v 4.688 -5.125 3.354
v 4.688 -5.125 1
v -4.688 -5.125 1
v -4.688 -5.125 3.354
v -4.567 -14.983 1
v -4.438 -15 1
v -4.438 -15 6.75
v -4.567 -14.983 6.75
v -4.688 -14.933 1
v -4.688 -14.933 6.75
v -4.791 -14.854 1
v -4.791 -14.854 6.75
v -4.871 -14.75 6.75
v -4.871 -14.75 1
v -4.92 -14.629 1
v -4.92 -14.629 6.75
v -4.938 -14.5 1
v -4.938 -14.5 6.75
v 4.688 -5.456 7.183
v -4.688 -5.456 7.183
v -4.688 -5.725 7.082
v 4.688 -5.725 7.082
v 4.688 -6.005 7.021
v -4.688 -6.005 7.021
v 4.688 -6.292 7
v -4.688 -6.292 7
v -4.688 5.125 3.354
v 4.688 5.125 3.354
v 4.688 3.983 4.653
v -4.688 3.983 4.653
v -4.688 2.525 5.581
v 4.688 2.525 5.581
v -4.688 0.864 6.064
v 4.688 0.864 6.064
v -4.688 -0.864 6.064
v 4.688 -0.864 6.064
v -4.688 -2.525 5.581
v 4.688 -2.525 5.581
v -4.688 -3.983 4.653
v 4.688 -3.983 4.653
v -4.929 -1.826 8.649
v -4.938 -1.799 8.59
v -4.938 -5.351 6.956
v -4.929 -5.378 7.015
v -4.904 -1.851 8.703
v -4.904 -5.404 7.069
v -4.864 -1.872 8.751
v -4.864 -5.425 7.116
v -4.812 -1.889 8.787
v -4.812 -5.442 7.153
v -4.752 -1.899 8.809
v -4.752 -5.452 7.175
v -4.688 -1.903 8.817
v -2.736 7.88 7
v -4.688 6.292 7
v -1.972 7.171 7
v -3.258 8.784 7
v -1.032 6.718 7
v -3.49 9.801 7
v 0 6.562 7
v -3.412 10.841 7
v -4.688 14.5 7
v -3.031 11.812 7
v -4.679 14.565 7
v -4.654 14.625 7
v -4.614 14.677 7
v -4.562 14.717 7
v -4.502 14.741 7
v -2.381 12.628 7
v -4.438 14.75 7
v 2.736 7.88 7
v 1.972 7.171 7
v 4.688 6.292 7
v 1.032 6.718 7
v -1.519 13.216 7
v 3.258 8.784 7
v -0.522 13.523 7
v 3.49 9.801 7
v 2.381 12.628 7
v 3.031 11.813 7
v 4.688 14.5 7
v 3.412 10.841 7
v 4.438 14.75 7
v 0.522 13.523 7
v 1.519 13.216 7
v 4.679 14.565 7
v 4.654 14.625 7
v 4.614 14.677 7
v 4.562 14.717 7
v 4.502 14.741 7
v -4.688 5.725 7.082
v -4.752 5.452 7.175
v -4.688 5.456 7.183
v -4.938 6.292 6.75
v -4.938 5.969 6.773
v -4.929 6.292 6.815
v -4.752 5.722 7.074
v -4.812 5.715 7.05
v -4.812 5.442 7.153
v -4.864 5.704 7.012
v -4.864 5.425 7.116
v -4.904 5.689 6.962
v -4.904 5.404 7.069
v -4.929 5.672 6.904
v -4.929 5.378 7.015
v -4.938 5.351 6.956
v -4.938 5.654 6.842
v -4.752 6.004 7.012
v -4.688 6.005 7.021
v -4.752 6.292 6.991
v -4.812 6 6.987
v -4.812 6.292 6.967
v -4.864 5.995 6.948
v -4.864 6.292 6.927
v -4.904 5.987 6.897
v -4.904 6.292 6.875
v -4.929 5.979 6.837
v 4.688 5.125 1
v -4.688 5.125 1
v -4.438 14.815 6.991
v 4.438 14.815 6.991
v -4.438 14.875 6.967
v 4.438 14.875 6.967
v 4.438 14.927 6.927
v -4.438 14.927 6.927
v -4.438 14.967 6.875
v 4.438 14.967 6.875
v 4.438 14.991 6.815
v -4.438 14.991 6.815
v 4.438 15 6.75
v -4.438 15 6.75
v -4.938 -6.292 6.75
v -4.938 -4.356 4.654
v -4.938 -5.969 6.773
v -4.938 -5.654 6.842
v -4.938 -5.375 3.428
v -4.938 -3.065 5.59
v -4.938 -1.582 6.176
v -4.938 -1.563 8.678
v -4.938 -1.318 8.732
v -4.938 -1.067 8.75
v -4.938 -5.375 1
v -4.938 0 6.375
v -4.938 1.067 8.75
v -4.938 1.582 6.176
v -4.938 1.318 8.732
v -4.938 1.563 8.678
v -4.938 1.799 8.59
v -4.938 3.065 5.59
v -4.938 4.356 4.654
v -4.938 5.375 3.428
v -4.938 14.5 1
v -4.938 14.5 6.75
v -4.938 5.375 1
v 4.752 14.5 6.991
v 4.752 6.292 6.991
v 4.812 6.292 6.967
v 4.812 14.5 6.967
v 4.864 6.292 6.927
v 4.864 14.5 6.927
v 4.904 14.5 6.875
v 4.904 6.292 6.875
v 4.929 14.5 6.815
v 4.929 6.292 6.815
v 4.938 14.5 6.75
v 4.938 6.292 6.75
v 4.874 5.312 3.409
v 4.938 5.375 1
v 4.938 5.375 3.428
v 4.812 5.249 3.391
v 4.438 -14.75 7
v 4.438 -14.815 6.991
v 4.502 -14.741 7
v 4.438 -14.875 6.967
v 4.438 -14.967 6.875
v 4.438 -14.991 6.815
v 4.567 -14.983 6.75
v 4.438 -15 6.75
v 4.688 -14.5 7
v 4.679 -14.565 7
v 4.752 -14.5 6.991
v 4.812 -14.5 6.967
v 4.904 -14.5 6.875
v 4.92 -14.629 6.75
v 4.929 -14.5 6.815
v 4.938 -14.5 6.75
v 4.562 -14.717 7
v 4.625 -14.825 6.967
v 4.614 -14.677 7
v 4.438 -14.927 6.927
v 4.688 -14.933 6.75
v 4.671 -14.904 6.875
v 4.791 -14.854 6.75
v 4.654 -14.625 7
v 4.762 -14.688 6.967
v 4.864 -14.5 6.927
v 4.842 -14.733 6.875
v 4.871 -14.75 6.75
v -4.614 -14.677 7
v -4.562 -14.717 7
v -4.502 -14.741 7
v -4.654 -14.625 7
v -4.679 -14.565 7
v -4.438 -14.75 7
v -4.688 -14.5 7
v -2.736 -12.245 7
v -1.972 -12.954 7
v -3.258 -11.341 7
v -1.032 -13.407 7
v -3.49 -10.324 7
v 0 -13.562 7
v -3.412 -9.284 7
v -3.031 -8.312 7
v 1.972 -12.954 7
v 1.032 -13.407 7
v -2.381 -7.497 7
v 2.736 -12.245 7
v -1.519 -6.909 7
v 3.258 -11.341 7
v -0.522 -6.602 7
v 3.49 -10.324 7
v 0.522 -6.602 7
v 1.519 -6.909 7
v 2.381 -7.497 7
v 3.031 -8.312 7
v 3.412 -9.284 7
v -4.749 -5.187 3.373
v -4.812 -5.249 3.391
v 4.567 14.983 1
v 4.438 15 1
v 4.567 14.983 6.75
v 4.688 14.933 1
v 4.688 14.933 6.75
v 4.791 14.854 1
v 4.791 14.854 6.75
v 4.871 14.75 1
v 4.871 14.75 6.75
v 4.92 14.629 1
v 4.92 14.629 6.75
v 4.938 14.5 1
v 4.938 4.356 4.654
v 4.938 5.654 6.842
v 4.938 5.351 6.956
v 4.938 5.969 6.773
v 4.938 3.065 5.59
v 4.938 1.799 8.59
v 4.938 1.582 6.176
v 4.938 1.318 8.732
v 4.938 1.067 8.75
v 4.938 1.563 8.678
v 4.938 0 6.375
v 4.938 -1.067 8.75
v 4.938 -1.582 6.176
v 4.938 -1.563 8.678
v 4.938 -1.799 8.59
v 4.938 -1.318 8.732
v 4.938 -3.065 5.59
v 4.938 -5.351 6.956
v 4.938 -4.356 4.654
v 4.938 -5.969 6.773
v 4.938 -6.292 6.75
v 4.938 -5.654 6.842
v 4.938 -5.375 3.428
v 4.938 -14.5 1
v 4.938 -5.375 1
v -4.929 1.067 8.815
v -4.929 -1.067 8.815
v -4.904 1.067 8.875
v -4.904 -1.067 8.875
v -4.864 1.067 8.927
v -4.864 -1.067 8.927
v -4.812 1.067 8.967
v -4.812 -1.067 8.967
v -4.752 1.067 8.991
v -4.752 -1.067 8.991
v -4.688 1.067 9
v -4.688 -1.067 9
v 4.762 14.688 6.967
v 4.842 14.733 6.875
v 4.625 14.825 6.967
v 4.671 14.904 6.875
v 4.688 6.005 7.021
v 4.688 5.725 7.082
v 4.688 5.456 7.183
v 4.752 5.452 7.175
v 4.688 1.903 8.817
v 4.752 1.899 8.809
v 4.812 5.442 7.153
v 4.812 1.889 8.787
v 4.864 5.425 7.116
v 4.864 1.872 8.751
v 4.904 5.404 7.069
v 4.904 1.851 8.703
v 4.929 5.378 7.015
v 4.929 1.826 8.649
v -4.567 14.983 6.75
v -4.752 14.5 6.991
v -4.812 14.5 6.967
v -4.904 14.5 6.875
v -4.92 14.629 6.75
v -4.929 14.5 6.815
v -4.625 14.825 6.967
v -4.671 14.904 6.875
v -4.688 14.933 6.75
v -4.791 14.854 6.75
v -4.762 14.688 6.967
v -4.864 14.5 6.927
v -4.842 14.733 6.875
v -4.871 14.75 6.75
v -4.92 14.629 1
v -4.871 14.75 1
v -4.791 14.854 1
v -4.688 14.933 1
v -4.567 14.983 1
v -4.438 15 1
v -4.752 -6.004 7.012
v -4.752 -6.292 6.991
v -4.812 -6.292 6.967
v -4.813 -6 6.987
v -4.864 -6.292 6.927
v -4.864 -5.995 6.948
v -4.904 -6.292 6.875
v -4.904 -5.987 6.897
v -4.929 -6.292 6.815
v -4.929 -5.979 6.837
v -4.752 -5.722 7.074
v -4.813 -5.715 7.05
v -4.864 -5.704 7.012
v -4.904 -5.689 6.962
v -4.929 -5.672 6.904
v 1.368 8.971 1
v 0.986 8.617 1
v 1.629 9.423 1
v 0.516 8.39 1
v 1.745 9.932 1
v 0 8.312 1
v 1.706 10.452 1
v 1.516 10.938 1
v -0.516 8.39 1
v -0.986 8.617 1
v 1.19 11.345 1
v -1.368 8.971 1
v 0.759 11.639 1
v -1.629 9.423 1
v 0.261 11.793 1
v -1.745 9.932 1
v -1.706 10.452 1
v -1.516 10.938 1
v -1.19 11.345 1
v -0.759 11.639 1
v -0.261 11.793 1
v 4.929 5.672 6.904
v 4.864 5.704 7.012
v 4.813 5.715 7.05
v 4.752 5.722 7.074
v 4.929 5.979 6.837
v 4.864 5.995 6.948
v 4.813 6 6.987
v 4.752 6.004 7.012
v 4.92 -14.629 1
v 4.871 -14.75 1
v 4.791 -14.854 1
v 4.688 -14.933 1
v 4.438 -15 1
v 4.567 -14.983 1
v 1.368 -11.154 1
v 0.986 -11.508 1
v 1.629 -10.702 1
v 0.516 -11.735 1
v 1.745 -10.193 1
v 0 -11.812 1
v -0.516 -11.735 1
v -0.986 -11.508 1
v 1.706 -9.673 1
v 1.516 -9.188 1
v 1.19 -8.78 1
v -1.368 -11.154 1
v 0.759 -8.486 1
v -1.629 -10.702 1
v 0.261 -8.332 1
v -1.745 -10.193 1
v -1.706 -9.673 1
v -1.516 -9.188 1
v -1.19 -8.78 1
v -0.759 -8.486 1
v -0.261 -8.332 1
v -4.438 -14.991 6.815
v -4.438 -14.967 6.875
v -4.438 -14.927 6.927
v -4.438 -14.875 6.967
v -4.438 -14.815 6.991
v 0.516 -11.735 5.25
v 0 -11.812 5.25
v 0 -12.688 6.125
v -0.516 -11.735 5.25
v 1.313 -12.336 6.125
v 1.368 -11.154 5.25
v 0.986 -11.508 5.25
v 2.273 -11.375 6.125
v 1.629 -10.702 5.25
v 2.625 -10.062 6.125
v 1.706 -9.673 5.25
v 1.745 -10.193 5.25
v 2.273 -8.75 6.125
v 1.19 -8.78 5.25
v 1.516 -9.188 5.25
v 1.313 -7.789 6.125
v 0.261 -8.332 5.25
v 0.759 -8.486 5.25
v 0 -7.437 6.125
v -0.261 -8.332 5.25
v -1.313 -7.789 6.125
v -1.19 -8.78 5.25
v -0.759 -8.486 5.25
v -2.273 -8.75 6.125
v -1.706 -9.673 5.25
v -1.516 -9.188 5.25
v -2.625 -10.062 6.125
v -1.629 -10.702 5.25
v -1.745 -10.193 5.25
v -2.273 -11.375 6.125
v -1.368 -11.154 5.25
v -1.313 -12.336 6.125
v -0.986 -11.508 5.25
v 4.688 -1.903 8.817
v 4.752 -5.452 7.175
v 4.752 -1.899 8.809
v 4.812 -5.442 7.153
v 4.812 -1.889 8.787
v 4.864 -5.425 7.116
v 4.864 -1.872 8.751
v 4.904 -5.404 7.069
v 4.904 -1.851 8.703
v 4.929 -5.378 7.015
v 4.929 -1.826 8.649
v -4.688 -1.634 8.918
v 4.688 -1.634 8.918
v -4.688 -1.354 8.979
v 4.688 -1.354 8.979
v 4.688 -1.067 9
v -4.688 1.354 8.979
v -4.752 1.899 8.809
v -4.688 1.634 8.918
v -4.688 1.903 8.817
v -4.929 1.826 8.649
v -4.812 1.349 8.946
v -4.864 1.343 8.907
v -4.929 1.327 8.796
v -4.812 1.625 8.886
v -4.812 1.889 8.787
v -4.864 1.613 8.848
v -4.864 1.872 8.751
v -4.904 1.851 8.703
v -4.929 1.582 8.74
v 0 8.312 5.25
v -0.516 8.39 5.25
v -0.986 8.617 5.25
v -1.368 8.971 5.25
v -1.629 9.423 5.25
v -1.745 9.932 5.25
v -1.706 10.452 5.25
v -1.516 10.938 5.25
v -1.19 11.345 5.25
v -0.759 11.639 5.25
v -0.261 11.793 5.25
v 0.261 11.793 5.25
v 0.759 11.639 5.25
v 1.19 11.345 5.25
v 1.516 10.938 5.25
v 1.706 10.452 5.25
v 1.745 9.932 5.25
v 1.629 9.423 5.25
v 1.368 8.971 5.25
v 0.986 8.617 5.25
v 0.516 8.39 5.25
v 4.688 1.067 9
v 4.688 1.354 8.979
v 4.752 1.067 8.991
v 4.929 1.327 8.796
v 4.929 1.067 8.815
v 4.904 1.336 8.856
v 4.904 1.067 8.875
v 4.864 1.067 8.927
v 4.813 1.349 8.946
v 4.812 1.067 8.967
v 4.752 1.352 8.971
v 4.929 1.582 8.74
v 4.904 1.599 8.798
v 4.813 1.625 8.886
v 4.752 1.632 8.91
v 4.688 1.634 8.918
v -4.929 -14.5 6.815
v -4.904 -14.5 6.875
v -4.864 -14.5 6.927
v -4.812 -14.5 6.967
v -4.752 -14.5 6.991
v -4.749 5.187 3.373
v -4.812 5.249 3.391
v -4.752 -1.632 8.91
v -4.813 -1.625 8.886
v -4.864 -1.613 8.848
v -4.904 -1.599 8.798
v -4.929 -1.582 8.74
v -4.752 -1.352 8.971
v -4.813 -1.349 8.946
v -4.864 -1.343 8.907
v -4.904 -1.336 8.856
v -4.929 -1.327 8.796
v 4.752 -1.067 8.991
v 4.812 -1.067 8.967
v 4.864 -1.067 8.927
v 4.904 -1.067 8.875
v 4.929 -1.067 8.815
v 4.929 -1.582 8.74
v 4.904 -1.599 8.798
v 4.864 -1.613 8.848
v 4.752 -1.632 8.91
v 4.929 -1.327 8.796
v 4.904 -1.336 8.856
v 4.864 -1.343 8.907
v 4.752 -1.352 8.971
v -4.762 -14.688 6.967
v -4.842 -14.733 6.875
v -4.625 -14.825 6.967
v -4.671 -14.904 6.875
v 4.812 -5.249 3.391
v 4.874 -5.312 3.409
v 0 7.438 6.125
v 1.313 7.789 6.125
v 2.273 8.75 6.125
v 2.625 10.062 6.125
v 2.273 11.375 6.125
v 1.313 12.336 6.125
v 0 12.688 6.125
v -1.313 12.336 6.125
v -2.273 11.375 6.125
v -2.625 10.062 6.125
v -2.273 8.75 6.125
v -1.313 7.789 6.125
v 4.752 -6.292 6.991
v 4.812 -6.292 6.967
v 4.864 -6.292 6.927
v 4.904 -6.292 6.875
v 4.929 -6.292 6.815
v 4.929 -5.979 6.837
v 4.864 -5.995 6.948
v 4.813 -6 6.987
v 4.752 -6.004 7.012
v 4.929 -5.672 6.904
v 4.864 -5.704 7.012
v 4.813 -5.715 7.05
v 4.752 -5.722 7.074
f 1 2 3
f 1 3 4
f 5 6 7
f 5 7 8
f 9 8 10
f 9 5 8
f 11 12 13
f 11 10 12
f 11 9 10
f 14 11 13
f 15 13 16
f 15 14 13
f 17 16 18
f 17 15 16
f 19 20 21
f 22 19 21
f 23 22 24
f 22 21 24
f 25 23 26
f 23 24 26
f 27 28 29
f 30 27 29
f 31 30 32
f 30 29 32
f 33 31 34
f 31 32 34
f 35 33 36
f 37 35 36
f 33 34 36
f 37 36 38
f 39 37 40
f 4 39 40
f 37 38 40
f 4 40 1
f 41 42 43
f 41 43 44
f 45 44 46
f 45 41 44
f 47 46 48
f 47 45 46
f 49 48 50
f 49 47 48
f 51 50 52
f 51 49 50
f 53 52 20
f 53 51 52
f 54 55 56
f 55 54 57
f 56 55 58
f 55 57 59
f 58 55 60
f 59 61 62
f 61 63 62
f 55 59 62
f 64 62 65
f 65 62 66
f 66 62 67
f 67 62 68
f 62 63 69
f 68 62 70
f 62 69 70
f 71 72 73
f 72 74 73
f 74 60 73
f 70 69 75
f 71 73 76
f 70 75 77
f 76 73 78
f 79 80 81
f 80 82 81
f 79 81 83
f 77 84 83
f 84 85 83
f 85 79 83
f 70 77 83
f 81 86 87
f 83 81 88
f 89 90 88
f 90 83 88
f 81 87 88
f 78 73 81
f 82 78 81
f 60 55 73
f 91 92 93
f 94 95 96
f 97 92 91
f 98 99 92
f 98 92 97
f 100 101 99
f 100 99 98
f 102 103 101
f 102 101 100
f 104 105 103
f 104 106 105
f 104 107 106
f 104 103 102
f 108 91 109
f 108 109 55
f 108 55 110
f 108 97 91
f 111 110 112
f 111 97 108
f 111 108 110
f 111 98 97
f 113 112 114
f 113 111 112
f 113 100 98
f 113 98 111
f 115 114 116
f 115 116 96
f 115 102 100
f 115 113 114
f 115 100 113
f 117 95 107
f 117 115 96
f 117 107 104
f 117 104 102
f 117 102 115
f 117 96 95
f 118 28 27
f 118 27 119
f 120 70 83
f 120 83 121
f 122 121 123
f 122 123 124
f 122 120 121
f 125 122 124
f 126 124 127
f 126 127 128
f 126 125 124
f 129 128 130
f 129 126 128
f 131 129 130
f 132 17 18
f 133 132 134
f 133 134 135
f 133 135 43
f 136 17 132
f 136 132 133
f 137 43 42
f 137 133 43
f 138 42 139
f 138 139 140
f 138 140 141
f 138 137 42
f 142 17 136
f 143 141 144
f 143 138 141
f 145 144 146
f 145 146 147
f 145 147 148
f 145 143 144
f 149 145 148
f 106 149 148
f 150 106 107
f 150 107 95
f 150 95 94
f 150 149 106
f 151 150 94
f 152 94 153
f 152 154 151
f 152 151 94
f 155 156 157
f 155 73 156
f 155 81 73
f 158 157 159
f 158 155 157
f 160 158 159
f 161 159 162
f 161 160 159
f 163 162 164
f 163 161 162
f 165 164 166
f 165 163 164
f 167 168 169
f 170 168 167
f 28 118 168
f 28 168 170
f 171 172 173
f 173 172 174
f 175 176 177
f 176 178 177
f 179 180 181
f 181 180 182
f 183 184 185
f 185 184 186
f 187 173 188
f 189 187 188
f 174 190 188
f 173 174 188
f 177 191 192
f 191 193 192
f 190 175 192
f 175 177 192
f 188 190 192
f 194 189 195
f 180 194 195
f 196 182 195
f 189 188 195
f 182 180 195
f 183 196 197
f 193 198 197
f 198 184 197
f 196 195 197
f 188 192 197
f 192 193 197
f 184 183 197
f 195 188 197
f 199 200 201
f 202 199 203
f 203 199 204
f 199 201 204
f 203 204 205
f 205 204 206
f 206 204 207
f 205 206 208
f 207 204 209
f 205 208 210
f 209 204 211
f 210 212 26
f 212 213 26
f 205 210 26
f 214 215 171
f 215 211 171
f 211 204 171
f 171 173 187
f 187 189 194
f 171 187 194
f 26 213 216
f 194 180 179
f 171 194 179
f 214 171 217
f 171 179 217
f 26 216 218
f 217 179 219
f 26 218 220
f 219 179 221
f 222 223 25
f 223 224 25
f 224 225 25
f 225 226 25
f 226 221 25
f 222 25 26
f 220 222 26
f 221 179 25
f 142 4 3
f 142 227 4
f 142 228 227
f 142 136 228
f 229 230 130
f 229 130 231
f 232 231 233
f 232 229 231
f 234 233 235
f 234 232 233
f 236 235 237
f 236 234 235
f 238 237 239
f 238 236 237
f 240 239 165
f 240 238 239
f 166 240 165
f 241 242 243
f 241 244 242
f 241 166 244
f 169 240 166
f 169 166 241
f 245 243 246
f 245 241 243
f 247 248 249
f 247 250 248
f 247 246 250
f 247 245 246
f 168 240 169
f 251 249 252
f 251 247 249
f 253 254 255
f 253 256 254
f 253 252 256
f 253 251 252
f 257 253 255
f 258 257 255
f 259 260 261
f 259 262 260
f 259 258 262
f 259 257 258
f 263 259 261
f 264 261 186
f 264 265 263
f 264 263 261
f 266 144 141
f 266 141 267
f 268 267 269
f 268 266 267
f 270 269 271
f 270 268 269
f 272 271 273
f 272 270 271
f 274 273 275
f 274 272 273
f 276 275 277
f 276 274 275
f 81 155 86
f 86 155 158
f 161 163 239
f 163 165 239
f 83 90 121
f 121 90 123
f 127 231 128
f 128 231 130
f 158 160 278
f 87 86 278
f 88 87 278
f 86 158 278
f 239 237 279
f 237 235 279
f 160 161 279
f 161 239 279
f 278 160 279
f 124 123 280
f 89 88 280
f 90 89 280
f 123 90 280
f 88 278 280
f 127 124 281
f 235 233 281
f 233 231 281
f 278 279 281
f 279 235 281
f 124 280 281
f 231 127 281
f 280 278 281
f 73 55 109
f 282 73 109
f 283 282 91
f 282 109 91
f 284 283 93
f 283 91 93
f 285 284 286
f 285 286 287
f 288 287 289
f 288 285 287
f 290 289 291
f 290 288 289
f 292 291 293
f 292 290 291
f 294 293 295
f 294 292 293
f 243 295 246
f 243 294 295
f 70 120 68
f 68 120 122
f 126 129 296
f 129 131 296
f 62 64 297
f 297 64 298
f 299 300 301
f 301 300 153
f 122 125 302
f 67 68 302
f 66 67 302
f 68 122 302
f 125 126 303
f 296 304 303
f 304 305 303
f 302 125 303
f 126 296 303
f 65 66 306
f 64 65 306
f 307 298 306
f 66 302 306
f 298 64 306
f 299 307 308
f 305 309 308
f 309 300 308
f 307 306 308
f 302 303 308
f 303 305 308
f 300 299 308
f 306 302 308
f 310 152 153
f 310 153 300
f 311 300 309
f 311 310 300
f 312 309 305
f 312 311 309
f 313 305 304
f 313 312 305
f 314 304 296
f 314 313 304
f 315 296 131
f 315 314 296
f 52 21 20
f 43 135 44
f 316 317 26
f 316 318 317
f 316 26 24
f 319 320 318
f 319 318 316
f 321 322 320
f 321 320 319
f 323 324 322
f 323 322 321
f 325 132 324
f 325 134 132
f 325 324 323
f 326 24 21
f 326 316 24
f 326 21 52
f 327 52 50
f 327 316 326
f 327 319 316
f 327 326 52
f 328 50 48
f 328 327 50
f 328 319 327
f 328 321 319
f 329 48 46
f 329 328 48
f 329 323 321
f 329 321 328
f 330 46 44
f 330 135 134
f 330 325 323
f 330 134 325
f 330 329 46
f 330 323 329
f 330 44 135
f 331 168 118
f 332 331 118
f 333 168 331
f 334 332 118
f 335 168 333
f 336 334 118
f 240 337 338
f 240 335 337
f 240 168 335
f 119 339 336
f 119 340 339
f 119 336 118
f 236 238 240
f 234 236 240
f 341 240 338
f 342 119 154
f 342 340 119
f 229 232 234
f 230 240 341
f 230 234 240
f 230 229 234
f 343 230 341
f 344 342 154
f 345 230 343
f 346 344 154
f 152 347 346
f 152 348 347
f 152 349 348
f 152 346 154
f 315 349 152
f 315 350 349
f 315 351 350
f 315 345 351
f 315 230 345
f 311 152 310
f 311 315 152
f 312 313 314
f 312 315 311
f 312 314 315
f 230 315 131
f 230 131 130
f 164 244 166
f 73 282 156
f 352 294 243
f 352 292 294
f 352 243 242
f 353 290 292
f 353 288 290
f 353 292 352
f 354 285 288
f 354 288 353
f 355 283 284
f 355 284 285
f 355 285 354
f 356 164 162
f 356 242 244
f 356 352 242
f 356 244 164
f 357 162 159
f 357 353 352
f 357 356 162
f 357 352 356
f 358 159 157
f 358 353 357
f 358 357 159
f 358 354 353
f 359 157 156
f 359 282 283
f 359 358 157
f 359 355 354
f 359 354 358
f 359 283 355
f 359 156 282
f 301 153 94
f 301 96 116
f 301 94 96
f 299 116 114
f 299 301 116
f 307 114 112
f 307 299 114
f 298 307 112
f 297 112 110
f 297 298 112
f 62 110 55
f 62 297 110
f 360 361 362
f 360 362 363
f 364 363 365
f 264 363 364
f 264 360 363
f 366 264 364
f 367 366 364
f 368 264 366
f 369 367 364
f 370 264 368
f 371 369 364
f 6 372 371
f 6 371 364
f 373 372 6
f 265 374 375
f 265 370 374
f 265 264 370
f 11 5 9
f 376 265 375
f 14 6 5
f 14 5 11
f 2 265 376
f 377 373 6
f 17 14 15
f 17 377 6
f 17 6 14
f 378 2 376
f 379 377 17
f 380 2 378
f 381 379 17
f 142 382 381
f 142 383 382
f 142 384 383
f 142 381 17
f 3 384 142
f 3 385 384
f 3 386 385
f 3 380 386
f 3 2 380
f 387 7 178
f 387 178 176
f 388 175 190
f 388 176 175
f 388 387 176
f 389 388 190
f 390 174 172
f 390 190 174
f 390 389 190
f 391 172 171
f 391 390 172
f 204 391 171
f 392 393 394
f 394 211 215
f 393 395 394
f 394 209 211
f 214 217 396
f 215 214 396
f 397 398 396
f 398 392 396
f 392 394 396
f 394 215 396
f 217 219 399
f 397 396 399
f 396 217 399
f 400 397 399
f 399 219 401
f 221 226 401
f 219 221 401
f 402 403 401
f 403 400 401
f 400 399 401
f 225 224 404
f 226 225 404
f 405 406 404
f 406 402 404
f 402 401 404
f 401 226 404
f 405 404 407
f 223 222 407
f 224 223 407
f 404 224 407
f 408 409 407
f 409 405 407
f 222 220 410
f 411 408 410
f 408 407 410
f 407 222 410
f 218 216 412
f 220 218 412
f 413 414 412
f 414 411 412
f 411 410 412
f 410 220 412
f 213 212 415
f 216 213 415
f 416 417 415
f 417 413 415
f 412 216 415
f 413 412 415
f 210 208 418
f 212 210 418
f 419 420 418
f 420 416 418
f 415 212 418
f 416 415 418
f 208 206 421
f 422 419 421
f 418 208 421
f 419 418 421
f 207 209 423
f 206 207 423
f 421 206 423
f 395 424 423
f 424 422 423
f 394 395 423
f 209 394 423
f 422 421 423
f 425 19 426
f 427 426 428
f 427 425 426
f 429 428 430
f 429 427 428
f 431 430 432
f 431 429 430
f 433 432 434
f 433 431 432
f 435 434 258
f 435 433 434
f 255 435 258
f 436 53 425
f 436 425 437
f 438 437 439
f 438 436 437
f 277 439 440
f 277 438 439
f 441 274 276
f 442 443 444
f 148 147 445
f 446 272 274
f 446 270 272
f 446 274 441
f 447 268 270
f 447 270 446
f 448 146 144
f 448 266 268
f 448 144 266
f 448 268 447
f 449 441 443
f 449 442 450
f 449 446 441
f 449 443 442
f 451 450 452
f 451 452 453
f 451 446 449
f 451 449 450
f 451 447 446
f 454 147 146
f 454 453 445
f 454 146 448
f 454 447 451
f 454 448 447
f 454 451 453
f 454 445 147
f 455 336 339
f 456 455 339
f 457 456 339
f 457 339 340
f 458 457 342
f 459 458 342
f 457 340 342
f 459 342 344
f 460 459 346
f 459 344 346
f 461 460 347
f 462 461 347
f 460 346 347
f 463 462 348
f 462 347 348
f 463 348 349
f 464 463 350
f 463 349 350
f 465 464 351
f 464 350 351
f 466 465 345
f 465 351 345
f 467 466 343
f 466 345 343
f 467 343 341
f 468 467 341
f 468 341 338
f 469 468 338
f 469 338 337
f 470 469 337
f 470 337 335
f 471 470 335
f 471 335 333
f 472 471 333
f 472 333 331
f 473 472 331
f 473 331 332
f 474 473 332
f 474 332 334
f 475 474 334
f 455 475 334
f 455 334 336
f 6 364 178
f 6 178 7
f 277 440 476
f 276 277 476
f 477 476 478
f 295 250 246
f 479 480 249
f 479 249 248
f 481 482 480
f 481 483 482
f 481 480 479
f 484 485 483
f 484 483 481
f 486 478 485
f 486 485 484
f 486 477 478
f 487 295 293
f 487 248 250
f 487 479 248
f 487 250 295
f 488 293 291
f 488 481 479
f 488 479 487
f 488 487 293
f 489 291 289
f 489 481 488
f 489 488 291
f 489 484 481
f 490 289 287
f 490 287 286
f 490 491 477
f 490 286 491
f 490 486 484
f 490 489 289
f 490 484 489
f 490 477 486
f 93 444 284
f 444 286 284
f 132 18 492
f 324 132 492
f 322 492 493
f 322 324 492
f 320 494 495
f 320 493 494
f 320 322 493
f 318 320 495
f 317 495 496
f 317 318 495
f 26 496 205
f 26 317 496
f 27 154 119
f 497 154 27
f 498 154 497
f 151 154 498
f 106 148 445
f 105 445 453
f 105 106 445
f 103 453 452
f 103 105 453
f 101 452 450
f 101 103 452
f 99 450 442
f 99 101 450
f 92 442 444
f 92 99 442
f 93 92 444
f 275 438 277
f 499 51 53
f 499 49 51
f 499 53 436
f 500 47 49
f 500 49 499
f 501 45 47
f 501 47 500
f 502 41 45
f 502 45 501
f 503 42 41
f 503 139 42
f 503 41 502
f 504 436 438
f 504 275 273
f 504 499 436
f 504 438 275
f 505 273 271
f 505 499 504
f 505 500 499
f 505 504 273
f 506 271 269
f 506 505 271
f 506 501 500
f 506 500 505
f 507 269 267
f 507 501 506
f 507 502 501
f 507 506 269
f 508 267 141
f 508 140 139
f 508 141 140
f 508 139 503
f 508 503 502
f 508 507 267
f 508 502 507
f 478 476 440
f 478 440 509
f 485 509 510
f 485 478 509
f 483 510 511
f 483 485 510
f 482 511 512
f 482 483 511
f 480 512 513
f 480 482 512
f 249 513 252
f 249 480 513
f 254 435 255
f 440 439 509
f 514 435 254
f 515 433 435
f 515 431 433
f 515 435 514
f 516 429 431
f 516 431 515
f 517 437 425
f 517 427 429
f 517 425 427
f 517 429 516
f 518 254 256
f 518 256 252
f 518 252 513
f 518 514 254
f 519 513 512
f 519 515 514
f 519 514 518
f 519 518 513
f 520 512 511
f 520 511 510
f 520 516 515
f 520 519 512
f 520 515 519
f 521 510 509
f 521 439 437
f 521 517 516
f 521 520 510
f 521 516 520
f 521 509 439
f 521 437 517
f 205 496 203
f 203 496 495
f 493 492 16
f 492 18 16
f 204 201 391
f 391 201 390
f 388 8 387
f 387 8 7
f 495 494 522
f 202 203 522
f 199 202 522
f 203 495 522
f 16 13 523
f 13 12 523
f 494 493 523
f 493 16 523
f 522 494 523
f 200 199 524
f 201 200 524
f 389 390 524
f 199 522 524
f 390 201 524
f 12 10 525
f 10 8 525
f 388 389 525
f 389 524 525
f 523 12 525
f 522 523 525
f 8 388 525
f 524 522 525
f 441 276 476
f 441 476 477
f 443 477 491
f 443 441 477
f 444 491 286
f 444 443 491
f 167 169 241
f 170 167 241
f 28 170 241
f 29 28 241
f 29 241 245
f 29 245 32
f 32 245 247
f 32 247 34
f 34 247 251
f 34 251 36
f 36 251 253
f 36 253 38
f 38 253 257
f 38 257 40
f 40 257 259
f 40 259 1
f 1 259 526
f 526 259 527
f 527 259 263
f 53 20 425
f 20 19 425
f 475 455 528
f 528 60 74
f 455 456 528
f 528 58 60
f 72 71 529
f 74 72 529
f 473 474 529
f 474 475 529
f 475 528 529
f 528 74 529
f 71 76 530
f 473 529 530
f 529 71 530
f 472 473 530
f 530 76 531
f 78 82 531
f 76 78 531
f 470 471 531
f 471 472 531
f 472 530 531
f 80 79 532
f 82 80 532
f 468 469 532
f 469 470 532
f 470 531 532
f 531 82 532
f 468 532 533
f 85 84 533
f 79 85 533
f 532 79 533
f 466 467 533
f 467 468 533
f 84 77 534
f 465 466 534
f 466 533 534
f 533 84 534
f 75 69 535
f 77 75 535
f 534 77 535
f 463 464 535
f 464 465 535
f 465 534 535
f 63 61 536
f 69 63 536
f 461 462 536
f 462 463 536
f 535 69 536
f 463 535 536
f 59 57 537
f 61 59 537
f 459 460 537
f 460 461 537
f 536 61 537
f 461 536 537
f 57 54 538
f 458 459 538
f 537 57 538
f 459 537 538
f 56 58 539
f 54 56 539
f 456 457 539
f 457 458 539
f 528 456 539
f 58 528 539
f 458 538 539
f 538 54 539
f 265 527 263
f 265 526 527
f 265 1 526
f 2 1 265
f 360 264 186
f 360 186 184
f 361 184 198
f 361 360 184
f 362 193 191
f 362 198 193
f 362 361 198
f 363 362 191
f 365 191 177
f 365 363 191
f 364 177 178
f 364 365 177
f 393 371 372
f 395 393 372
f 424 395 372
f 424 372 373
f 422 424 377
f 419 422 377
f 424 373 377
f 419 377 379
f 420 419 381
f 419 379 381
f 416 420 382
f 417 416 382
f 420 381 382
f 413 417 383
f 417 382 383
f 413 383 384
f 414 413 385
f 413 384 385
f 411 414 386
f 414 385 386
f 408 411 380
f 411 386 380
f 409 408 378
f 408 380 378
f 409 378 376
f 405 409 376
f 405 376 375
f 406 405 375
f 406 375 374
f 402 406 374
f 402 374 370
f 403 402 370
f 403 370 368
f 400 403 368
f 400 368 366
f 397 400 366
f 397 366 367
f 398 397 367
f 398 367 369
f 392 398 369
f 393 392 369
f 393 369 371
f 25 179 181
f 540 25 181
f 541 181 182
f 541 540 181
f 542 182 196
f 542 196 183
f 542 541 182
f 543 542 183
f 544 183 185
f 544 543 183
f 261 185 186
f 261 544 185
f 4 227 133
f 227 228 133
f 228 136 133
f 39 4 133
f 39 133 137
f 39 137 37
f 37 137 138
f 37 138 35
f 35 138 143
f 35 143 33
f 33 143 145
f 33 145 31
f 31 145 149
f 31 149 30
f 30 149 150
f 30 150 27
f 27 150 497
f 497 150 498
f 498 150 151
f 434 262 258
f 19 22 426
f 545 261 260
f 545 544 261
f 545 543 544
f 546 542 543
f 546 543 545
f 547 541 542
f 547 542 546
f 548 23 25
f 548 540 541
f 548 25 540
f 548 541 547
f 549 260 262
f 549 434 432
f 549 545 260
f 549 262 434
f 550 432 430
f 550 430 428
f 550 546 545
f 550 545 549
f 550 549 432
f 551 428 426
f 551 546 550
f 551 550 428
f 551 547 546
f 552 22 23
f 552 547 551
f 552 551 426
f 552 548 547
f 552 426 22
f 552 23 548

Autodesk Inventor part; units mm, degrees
ref_plane "YZ Plane" through (0, 0, 0) normal (1, 0, 0) x (0, 1, 0)
ref_plane "XZ Plane" through (0, 0, 0) normal (0, 1, 0) x (-1, 0, 0)
ref_plane "XY Plane" through (0, 0, 0) normal (0, 0, 1) x (1, 0, 0)
sketch "Náčrt1" plane through (0, 0, 0) normal (0, 0, 1) x (1, 0, 0)
  line L0 (-4.9375, 15) -> (4.9375, 15)
  line L1 (4.9375, 15) -> (4.9375, -15)
  line L2 (4.9375, -15) -> (-4.9375, -15)
  line L3 (-4.9375, -15) -> (-4.9375, 15)
  line L4 (-4.9375, 15) -> (4.9375, -15) construction
  line L5 (4.9375, 15) -> (-4.9375, -15) construction
  circle A0 centre (0, 10.0625) radius 1.5
  circle A1 centre (0, -10.0625) radius 1.5
  line L6 (-4.9375, 0) -> (4.9375, 0)
  point P0 (0, 0)
  point P1 (0, 15)
  dimension "d0" = 30
  dimension "d1" = 9.875
  dimension "d2" = 3
  dimension "d4" = 4.9375
extrude "Vysunutí1" add sketch "Náčrt1" along normal blind 10
sketch "Náčrt2" plane through (4.9375, -15, 0) normal (1, 0, 0) x (0, 0, -1)
  line L0 (0, 0) -> (0, 30) projected
  line L1 (0, 10) -> (-3.3166, 10)
  arc A0 (-3.3166, 20) -> (-3.3166, 10) centre (0, 15) ccw
  line L2 (-3.3166, 20) -> (0, 20)
  line L3 (0, 9.875) -> (-3.3541, 9.875)
  arc A1 (-3.3541, 20.125) -> (-3.3541, 9.875) centre (0, 15) ccw
  line L4 (-3.3541, 20.125) -> (0, 20.125)
  line L5 (0, 30) -> (-10, 30) projected
  line L6 (0, 6.875) -> (-4.1533, 6.875) construction
  arc A2 (-4.1533, 23.125) -> (-4.1533, 6.875) centre (0, 15) ccw construction
  line L7 (-4.1533, 23.125) -> (0, 23.125) construction
  line L8 (0, 0) -> (-10, 0) projected
  line L9 (-7, 0) -> (-7, 9.1463)
  line L10 (-7, 9.1463) -> (-9, 13.4948)
  line L11 (-9, 16.5052) -> (-7, 20.8537)
  line L12 (-7, 20.8537) -> (-7, 30)
  line L13 (-9, 13.4948) -> (-9, 16.5052)
  line L14 (-10, 0) -> (-10, 30) projected
  point P0 (0, 15)
  point P1 (0, 9.875)
  point P2 (-9, 15)
  point P3 (-10, 15)
  dimension "d7" = 6
  dimension "d8" = 10
  dimension "d9" = 0.125
  dimension "d16" = 3
  dimension "d17" = 3
  dimension "d18" = 3
  dimension "d19" = 1
extrude "Vysunutí2" cut sketch "Náčrt2" against normal through all contours L3 A1 L4 L0 L2 A0 L1 | L8 L14 L5 L12 L11 L13 L10 L9 | L1 A0 L2 L0
fillet "Zaoblení1" radius 2 4 edges at (0, -1.5052, 9) (0, 1.5052, 9) (0, 5.8537, 7) (0, -5.8537, 7)
fillet "Zaoblení2" radius 0.25 20 edges at (0, -15, 7) (0, 15, 7) (4.9375, -5.8638, 7.0463) (4.9375, -3.6794, 8) (4.9375, -1.4951, 8.9537) (4.9375, 0, 9) (4.9375, 1.4951, 8.9537) (4.9375, 3.6794, 8) (4.9375, 5.8638, 7.0463) (4.9375, 10.6458, 7) (4.9375, -10.6458, 7) (-4.9375, -5.8638, 7.0463) (-4.9375, -3.6794, 8) (-4.9375, -1.4951, 8.9537) (-4.9375, 0, 9) (-4.9375, 1.4951, 8.9537) (-4.9375, 3.6794, 8) (-4.9375, 5.8638, 7.0463) (-4.9375, 10.6458, 7) (-4.9375, -10.6458, 7)
sketch "Náčrt3" plane through (0, 0, 0) normal (0, 0, -1) x (-1, 0, 0)
  line L0 (4.9375, -5.125) -> (-4.9375, -5.125) projected
  line L1 (-4.9375, -15) -> (-4.9375, -5.125) projected
  line L2 (4.9375, -15) -> (-4.9375, -15) projected
  line L3 (4.9375, -5.125) -> (4.9375, -15) projected
  circle A0 centre (0, -10.0625) radius 1.5 projected
  line L4 (-4.9375, 5.125) -> (4.9375, 5.125) projected
  line L5 (4.9375, 15) -> (4.9375, 5.125) projected
  line L6 (-4.9375, 15) -> (4.9375, 15) projected
  line L7 (-4.9375, 5.125) -> (-4.9375, 15) projected
  circle A1 centre (0, 10.0625) radius 1.5 projected
  point P0 (0, 0)
extrude "Vysunutí3" cut sketch "Náčrt3" against normal blind 1
chamfer "Zkosení1" distance 0.25 angle 45 6 edges at (4.9375, -5.125, 2.1771) (4.9375, 0, 6.125) (4.9375, 5.125, 2.1771) (-4.9375, -5.125, 2.1771) (-4.9375, 0, 6.125) (-4.9375, 5.125, 2.1771)
fillet "Zaoblení3" radius 0.5 8 edges at (4.8643, -14.9268, 6.9268) (4.9375, -15, 3.875) (-4.8643, -14.9268, 6.9268) (-4.9375, -15, 3.875) (-4.8643, 14.9268, 6.9268) (-4.9375, 15, 3.875) (4.8643, 14.9268, 6.9268) (4.9375, 15, 3.875)
sketch "Náčrt4" plane through (-4.6875, 6.2916, 7) normal (0, 0, 1) x (1, 0, 0)
  circle A0 centre (4.6875, 3.7709) radius 1.5 projected
  point P0 (4.6875, -6.2916)
hole "Díra1" at (0, 10.0625, 7) direction (0, 0, -1) diameter 3.5 end through all countersink diameter 7 countersink angle 90
sketch "Náčrt5" plane through (-4.6875, -6.2916, 7) normal (0, 0, 1) x (1, 0, 0)
  circle A0 centre (4.6875, -3.7709) radius 1.5 projected
  point P0 (4.6875, 6.2916)
hole "Díra2" at (0, -10.0625, 7) direction (0, 0, -1) diameter 3.5 end through all countersink diameter 7 countersink angle 90
properties part number "Objímka motoru pro plochu s držákem"
